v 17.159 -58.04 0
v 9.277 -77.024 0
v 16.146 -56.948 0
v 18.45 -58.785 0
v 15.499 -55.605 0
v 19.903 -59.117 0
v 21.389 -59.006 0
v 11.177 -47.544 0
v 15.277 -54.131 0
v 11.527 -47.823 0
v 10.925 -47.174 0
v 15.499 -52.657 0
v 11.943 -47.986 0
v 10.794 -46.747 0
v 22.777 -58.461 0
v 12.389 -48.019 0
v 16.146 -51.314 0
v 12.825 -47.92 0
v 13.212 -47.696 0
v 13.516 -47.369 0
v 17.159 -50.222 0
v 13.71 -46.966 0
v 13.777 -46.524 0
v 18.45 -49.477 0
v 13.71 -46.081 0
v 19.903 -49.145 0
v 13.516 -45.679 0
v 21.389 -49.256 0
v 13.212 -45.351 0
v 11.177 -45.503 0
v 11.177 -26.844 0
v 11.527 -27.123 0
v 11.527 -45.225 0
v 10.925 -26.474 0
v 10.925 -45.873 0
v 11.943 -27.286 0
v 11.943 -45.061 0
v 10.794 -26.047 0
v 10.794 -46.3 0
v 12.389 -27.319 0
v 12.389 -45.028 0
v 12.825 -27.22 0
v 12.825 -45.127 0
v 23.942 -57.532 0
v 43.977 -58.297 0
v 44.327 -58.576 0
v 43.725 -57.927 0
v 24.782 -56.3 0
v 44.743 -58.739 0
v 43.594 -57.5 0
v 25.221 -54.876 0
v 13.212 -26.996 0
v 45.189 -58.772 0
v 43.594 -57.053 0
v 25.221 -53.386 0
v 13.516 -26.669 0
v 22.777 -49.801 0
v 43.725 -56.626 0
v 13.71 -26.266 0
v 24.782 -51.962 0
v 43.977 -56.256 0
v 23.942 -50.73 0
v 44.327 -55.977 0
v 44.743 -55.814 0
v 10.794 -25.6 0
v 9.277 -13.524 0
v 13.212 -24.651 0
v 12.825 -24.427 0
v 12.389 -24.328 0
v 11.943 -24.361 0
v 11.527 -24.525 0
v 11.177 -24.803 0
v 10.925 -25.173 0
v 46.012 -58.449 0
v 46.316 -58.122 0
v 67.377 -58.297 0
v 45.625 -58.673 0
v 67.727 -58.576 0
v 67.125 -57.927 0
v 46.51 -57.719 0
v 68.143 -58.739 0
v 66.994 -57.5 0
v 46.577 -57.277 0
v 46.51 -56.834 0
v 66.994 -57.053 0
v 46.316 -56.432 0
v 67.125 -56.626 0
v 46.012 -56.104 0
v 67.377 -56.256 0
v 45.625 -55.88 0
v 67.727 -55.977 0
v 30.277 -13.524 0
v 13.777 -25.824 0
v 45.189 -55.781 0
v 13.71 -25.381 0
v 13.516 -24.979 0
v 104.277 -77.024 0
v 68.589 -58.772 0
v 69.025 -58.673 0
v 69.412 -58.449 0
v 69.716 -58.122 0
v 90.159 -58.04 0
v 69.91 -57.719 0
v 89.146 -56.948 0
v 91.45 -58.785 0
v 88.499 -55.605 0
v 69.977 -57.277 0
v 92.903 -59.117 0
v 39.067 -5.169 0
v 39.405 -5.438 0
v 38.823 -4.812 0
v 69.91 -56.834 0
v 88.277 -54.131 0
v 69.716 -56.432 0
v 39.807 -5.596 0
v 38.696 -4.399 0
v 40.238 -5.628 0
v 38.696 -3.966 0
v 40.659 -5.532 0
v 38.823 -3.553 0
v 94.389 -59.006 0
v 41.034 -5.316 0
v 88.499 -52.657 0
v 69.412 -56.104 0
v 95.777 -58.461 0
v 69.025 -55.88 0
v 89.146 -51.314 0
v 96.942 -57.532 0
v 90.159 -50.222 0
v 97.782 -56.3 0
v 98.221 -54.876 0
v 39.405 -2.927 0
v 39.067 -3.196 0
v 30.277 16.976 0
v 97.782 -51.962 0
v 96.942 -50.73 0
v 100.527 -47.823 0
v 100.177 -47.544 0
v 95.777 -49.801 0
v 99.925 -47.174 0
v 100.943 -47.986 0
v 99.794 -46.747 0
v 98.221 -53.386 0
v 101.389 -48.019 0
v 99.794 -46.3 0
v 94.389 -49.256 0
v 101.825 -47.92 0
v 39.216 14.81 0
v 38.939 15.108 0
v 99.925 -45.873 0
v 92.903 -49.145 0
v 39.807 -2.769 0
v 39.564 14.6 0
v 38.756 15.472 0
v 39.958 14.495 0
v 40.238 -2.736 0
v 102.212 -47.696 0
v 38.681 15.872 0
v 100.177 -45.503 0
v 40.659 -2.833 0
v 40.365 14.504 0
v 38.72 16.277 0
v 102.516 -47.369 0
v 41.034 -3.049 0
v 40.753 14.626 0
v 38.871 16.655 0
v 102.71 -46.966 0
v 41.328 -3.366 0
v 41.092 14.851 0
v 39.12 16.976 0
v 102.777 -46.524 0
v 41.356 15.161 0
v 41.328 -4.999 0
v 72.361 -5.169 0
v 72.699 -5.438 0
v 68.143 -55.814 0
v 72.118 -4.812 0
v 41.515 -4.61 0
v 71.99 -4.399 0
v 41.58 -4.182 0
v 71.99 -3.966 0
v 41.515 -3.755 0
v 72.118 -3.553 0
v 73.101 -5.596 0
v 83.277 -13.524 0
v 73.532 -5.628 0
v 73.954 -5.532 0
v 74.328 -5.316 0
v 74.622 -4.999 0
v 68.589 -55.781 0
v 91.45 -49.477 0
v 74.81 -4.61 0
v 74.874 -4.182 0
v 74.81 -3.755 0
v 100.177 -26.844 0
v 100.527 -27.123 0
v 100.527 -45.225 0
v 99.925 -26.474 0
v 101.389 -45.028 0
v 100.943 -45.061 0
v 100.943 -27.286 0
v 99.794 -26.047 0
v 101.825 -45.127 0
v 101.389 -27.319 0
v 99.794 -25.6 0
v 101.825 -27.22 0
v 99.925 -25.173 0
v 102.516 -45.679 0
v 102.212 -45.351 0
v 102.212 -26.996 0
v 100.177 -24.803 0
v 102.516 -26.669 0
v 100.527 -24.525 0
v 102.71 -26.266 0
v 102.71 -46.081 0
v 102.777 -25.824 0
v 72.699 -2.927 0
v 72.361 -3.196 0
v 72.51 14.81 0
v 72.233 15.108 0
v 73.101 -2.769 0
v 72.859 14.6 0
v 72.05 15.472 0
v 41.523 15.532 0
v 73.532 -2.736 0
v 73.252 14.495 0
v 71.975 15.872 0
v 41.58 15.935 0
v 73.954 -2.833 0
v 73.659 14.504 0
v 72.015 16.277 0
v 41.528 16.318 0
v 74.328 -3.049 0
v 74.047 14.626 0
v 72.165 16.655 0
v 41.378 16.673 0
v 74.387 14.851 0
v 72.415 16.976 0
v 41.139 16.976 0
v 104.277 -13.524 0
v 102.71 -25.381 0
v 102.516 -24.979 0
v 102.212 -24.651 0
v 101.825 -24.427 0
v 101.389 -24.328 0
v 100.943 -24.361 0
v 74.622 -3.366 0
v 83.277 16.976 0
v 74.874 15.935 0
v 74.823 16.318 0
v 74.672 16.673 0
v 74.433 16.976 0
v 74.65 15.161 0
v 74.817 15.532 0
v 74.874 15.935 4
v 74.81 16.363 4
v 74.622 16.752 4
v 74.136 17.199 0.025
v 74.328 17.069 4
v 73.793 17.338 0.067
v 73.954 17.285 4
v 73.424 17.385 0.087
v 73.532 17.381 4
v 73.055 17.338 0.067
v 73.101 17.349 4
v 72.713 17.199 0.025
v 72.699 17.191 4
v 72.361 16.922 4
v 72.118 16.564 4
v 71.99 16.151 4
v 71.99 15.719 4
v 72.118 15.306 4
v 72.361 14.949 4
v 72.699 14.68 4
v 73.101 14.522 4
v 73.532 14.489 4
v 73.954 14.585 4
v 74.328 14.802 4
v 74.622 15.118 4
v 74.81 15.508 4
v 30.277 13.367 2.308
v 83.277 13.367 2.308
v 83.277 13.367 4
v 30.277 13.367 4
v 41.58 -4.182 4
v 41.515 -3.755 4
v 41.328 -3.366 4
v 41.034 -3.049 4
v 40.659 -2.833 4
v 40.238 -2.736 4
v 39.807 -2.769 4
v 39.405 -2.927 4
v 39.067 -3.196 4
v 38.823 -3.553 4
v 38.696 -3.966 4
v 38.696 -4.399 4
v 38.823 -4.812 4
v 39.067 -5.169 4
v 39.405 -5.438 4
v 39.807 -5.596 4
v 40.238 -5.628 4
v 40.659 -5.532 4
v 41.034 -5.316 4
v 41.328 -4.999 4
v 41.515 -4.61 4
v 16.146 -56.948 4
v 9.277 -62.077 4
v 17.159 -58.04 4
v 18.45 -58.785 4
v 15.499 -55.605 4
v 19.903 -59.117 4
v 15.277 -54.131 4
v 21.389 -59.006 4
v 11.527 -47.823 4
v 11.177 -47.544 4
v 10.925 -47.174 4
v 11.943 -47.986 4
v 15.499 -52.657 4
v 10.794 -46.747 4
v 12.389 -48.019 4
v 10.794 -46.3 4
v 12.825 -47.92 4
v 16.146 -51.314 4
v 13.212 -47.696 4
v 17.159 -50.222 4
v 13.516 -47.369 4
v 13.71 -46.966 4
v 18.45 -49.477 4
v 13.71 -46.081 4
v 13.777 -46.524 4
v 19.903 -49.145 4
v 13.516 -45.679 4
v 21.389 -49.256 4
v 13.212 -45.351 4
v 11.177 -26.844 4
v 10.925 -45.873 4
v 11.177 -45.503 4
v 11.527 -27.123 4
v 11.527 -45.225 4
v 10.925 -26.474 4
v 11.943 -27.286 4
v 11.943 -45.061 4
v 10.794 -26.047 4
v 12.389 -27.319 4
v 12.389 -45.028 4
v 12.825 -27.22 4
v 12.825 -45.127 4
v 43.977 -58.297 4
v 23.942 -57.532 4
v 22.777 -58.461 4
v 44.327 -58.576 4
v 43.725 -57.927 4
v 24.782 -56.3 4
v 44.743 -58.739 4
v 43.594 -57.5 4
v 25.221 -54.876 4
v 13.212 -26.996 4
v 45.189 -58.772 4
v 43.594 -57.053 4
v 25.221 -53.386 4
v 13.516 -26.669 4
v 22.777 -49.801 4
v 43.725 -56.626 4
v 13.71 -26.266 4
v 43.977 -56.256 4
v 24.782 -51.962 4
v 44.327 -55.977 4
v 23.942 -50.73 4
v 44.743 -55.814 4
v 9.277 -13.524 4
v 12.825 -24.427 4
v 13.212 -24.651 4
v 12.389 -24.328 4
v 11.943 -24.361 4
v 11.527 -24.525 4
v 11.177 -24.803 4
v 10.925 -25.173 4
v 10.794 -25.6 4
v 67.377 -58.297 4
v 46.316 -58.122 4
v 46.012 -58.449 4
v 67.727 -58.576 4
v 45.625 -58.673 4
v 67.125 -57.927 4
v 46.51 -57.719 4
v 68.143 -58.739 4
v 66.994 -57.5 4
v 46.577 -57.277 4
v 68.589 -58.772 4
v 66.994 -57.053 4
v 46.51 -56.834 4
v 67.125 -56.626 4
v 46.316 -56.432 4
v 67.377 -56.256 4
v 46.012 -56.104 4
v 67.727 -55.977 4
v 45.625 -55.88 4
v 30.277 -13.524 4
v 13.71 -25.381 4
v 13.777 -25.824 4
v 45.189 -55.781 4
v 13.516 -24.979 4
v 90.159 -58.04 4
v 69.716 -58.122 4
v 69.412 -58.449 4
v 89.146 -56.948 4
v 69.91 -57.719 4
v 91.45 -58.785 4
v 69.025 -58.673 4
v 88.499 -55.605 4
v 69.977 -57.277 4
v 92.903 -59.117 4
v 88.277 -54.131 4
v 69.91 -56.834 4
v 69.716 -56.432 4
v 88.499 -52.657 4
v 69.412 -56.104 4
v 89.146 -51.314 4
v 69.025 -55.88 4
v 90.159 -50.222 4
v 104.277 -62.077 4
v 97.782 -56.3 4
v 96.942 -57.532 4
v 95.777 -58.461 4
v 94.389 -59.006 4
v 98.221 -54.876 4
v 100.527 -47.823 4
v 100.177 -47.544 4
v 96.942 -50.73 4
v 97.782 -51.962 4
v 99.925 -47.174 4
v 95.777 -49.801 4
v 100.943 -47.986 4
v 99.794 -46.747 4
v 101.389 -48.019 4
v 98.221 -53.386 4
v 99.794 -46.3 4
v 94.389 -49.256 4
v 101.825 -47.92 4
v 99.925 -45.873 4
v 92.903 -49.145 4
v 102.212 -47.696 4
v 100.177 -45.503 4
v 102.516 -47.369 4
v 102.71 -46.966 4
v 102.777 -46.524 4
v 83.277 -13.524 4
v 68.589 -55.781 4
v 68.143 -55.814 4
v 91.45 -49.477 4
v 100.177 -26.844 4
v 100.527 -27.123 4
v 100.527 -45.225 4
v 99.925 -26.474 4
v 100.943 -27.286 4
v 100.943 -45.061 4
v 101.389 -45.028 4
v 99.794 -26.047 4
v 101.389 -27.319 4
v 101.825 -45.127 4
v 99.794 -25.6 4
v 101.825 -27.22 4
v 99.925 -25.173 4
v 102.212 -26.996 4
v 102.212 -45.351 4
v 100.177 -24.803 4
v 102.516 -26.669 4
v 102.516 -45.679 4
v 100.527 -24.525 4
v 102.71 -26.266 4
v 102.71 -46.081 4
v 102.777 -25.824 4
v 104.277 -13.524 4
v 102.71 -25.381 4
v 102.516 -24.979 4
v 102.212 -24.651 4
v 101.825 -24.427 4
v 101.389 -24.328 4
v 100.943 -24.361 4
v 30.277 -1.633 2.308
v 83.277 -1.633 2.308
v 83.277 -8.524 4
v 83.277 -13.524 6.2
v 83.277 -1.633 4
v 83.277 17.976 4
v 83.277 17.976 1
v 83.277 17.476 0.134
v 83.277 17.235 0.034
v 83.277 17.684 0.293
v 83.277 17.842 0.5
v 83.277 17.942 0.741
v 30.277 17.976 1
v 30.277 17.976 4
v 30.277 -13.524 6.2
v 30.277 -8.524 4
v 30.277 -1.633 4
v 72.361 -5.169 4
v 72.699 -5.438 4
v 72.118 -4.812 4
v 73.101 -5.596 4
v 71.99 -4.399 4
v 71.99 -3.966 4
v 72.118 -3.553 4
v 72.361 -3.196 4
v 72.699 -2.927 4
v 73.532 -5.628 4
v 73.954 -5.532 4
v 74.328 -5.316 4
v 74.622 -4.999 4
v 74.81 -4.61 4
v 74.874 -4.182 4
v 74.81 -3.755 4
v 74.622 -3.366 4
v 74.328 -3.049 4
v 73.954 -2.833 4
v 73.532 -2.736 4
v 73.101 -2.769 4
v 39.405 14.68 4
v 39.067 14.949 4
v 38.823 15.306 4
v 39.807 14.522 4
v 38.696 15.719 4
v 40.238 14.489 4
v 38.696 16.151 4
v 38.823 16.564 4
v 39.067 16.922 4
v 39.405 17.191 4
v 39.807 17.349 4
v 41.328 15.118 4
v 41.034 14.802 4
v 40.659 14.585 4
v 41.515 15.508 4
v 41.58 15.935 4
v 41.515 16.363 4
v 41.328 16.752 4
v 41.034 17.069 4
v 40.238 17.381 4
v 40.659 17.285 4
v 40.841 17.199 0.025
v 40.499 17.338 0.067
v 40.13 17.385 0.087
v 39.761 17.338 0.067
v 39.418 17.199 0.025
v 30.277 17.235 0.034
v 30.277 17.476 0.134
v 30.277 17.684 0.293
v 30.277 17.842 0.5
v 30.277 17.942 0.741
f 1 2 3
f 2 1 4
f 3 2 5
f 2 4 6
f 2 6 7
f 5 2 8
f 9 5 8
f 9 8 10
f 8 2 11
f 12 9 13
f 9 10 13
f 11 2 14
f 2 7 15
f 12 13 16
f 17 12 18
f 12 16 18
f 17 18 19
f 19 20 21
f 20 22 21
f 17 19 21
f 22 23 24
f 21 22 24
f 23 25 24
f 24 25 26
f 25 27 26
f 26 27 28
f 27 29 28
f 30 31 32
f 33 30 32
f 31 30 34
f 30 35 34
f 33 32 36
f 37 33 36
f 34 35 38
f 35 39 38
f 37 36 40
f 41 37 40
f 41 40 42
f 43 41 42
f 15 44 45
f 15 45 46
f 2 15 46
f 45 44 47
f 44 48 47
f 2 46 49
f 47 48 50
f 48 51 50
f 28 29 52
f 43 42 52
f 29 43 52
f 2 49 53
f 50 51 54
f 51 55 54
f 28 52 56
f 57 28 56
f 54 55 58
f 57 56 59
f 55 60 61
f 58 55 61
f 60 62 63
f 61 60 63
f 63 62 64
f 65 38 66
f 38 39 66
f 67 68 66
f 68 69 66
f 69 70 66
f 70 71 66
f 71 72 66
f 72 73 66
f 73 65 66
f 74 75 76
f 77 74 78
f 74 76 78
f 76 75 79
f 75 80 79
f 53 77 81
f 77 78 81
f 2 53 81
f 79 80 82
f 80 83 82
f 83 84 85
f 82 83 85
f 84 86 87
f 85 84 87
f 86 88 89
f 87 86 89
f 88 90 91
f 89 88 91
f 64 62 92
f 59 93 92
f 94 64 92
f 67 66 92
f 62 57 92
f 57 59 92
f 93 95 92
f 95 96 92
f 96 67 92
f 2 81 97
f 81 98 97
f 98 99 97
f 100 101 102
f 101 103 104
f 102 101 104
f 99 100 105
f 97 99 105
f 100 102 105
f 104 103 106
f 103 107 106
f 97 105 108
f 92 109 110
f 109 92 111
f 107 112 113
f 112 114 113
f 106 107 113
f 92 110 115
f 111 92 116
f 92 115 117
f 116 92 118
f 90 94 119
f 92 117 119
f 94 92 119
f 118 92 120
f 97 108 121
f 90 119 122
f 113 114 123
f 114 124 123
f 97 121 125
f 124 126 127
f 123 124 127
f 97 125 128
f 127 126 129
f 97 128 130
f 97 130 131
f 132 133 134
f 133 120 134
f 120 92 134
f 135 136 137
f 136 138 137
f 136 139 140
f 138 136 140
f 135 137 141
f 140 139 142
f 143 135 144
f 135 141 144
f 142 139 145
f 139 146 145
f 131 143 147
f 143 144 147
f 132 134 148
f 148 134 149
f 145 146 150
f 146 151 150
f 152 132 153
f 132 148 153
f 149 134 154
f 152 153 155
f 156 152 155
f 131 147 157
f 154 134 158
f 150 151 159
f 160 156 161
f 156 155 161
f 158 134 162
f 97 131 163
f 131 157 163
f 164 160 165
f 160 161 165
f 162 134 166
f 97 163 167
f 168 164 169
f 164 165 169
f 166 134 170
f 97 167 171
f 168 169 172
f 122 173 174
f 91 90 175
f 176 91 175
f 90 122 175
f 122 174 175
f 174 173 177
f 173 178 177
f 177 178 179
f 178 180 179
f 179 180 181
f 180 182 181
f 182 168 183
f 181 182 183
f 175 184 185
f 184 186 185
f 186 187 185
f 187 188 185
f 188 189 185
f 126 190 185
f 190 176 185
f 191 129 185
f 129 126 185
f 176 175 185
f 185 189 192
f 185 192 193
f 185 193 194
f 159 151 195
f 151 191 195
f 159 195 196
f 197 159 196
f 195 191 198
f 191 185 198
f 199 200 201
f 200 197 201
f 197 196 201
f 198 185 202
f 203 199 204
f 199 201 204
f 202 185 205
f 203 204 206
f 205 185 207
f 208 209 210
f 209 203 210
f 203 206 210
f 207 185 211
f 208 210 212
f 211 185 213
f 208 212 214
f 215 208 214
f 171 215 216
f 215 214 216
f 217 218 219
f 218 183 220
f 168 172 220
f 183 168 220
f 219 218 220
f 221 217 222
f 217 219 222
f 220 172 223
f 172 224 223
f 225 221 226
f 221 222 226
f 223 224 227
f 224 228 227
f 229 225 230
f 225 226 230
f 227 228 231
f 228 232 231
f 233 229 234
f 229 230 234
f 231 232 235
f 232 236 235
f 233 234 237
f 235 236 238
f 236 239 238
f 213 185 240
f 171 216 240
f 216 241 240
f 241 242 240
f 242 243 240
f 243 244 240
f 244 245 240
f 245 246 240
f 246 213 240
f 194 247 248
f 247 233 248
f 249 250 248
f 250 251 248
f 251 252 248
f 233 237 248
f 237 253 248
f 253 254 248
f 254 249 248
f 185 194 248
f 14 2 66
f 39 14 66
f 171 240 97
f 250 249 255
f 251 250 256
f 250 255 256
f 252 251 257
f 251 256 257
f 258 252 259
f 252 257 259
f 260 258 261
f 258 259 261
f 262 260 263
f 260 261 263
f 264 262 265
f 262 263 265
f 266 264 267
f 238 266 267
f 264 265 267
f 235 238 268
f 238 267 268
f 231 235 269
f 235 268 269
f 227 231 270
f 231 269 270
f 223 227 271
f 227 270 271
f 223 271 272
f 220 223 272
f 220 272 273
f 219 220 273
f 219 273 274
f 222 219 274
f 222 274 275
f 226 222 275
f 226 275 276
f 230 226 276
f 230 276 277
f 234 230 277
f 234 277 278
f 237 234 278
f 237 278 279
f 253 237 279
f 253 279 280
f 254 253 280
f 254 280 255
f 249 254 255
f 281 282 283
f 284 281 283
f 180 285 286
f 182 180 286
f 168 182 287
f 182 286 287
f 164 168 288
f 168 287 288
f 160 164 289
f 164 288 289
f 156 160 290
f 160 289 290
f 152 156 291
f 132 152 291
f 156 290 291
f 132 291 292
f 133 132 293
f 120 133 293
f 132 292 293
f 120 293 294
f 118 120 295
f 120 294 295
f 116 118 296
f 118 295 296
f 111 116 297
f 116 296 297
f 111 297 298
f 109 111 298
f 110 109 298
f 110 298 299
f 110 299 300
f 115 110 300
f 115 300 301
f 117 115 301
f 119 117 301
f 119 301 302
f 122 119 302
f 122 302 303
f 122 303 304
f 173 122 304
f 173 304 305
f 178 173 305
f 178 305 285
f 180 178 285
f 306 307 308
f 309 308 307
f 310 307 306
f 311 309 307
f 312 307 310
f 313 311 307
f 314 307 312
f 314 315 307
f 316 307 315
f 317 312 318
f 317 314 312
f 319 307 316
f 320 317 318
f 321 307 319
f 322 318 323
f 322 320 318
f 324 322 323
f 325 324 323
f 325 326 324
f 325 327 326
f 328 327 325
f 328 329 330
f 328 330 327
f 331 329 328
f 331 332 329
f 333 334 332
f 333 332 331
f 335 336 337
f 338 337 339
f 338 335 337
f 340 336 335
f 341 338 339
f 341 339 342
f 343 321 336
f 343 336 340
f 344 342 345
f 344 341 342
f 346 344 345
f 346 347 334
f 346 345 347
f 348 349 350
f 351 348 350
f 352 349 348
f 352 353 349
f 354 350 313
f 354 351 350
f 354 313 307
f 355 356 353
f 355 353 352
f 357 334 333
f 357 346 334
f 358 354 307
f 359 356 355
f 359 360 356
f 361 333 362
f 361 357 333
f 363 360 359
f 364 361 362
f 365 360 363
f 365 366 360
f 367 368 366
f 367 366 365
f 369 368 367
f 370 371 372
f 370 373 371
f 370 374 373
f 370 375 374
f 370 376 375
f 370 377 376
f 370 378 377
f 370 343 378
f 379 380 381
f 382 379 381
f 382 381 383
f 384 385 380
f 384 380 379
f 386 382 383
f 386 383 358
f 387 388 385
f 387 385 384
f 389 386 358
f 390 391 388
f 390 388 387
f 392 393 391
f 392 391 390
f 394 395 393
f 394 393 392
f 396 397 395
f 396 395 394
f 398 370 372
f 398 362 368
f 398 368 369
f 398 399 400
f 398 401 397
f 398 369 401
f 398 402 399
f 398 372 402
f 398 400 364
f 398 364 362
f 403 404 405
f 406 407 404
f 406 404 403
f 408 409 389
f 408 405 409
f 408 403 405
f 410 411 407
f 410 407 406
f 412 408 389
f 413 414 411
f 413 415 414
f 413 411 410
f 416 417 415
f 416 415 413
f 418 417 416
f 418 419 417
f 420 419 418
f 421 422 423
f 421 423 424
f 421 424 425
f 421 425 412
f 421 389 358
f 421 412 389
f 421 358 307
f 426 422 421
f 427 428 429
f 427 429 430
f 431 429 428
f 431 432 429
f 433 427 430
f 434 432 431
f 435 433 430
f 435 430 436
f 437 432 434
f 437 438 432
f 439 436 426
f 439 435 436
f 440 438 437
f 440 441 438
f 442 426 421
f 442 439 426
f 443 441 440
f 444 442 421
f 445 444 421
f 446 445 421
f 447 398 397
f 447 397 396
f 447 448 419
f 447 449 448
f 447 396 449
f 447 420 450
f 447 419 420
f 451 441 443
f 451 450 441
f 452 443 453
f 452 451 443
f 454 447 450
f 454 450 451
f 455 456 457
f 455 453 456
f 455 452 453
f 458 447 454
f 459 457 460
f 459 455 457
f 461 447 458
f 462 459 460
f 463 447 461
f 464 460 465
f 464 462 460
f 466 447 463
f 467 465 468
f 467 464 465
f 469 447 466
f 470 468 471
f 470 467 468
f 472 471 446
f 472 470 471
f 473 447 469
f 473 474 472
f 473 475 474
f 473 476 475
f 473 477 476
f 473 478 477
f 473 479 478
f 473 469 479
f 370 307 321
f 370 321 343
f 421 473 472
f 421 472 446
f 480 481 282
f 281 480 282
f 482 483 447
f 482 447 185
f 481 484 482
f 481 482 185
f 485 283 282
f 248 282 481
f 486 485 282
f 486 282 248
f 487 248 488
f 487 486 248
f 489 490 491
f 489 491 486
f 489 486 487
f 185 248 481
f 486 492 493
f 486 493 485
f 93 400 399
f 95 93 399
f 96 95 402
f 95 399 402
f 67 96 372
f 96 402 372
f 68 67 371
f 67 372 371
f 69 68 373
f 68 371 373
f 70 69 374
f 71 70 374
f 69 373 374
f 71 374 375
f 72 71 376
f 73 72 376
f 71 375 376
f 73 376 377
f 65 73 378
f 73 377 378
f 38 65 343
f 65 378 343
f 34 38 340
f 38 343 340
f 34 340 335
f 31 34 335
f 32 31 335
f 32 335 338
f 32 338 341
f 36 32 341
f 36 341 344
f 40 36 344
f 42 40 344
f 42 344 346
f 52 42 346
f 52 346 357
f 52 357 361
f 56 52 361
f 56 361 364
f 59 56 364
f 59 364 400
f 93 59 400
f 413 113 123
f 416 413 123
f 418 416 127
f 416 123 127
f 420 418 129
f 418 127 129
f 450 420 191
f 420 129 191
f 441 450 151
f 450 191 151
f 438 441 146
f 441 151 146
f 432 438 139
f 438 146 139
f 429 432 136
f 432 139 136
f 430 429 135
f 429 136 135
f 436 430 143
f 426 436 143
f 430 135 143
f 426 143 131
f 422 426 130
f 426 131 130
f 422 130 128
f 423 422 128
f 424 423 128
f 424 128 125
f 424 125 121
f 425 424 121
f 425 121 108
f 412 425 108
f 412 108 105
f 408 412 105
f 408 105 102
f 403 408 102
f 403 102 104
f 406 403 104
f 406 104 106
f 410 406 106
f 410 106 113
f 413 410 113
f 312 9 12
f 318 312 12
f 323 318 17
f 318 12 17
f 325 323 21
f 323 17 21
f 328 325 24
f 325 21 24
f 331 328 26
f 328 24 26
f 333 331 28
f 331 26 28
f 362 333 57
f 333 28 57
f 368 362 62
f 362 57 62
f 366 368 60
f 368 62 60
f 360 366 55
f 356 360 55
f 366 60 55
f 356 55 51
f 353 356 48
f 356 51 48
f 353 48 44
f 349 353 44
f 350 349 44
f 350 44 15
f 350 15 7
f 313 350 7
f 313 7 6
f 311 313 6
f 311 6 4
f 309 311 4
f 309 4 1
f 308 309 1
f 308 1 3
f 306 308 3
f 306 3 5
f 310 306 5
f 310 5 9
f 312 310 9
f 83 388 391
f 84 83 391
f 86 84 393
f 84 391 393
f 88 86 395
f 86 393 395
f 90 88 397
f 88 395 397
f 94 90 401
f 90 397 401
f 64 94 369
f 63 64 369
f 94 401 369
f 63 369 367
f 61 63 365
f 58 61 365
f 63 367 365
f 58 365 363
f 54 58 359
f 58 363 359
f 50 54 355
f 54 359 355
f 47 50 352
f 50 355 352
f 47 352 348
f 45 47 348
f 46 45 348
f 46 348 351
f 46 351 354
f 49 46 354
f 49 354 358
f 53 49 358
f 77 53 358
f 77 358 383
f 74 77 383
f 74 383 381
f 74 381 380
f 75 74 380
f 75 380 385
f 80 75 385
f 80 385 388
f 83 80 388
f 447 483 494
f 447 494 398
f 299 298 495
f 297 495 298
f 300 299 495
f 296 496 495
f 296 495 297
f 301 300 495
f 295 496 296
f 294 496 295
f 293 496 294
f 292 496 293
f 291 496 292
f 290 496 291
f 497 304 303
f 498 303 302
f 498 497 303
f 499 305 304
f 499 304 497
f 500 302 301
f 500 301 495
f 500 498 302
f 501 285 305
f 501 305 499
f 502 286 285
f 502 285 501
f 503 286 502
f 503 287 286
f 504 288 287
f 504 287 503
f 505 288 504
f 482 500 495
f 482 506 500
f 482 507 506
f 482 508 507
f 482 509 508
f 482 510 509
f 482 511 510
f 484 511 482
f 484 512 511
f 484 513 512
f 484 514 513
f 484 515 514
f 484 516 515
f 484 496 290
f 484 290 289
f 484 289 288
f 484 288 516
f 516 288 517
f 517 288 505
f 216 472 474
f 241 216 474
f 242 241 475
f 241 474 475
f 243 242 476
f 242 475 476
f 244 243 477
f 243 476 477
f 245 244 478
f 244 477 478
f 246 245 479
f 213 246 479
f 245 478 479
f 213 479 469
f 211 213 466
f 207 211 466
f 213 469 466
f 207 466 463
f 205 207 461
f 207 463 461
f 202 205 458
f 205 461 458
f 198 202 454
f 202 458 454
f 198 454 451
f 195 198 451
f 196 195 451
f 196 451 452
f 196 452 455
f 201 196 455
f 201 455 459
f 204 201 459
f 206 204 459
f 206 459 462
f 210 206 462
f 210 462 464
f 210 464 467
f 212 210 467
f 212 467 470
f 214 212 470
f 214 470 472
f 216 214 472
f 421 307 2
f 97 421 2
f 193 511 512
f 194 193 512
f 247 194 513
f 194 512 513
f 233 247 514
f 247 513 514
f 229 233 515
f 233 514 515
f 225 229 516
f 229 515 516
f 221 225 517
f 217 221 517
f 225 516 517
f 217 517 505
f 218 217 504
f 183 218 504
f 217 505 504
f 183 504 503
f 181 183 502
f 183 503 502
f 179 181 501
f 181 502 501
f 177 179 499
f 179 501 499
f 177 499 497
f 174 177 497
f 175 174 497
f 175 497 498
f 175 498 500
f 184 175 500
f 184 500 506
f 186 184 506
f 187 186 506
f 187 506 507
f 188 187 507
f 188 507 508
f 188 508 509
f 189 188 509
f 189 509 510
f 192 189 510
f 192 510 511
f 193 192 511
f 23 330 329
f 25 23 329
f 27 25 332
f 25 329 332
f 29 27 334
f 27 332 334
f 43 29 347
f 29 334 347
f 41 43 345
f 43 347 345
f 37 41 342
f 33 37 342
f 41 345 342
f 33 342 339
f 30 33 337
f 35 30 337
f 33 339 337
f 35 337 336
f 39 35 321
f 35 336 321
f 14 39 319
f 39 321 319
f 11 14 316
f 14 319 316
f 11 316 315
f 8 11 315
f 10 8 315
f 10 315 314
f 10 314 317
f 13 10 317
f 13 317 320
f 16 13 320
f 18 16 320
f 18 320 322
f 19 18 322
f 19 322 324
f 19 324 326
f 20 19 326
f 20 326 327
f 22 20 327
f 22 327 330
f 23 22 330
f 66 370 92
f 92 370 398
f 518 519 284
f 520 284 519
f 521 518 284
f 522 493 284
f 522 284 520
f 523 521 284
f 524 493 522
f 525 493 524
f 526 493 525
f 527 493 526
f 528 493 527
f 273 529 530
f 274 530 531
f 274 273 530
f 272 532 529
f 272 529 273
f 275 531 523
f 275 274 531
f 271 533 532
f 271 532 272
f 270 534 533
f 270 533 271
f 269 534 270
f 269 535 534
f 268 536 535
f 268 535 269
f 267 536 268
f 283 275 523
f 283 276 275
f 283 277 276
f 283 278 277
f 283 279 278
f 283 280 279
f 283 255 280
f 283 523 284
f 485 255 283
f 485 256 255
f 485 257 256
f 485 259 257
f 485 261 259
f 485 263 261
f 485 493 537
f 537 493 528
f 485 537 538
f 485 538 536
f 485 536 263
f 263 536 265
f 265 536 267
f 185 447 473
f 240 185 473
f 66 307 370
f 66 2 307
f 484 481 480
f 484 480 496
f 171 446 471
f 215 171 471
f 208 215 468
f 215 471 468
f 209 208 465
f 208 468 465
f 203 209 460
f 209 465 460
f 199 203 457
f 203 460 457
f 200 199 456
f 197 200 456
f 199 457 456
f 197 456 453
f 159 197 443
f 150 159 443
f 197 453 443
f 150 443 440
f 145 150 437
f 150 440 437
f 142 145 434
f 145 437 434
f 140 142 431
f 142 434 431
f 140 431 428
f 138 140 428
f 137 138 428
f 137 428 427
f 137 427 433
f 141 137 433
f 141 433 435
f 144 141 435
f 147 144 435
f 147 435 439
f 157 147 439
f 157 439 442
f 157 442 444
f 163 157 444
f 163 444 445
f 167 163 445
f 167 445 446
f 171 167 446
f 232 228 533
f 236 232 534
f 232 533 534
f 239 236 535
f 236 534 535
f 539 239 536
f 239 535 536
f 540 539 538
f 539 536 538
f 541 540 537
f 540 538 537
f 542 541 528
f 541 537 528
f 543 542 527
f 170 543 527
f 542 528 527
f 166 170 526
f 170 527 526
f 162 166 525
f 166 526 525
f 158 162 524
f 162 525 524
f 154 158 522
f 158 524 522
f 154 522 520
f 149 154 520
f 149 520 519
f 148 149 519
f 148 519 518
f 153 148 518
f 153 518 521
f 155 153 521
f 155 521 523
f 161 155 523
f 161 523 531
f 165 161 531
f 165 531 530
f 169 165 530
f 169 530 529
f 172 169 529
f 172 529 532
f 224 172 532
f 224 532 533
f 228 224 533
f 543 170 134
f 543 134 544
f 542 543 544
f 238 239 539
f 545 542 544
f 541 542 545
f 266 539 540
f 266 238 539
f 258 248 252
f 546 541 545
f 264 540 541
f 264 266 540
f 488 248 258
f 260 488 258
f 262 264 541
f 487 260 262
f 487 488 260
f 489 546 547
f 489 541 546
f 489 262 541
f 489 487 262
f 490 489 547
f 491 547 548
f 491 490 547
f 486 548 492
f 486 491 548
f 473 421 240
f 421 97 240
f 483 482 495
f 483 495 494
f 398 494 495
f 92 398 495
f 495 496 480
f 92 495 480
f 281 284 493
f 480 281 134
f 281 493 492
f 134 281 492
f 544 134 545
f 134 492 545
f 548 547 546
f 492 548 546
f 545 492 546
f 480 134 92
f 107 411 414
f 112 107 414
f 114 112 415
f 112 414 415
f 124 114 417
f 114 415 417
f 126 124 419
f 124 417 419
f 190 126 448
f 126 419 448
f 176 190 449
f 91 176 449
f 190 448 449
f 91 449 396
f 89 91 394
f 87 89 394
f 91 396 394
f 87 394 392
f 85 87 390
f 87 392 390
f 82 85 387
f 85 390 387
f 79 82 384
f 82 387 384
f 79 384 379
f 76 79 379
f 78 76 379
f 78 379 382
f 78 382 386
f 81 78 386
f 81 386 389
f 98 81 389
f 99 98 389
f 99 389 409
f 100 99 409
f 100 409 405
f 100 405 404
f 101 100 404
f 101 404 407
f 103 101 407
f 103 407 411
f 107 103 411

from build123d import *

# Parameters (mm, degrees)
CROQUIS1_W              = 95
CROQUIS1_H              = 95
SALIENTE_EXTRUIR1_DEPTH = 4
CORTAR_EXTRUIR1_DEPTH   = 100
CROQUIS5_W              = 21
CROQUIS5_H              = 31.5
CORTAR_EXTRUIR2_DEPTH   = 100
CROQUIS6_W              = 21
CROQUIS6_H              = 31.5
CORTAR_EXTRUIR3_DEPTH   = 100
CROQUIS7_W              = 3
CROQUIS7_H              = 15
CORTAR_EXTRUIR4_DEPTH   = 100
REDONDEO1_R             = 1
CROQUIS8_R              = 5
CORTAR_EXTRUIR5_DEPTH   = 10
SALIENTE_EXTRUIR2_DEPTH = 53
CROQUIS10_R             = 1.5
CORTAR_EXTRUIR6_DEPTH   = 10
CROQUIS11_R             = 1.45
CORTAR_EXTRUIR7_DEPTH   = 20


with BuildPart() as part:
    # Croquis1 → Saliente-Extruir1 (new body)
    with BuildSketch(Plane.XY):
        with Locations((56.776857567, -29.52358237)):
            Rectangle(CROQUIS1_W, CROQUIS1_H)
    extrude(amount=SALIENTE_EXTRUIR1_DEPTH)

    # Croquis3 → Cortar-Extruir1 (cut)
    with BuildSketch(Plane.ZY.offset(-9.276857567)):
        Polygon((4, -62.076521477), (0, -77.02358237), (4, -77.02358237), align=None)
    extrude(amount=-CORTAR_EXTRUIR1_DEPTH, mode=Mode.SUBTRACT)

    # Croquis5 → Cortar-Extruir2 (cut)
    with BuildSketch(Plane.XY.offset(4)):
        with Locations((19.776857567, 2.22641763)):
            Rectangle(CROQUIS5_W, CROQUIS5_H)
    extrude(amount=-CORTAR_EXTRUIR2_DEPTH, mode=Mode.SUBTRACT)

    # Croquis6 → Cortar-Extruir3 (cut)
    with BuildSketch(Plane.XY.offset(4)):
        with Locations((93.776857567, 2.22641763)):
            Rectangle(CROQUIS6_W, CROQUIS6_H)
    extrude(amount=-CORTAR_EXTRUIR3_DEPTH, mode=Mode.SUBTRACT)

    # Croquis7 → Cortar-Extruir4 (cut)
    with BuildSketch(Plane.ZY.offset(-30.276857567)):
        with Locations((3.808437884, 5.867431485)):
            Rectangle(CROQUIS7_W, CROQUIS7_H)
    extrude(amount=-CORTAR_EXTRUIR4_DEPTH, mode=Mode.SUBTRACT)

    # Redondeo1
    redondeo1_edges = [part.edges().sort_by_distance(p)[0] for p in [
        (56.776857567, 17.97641763, 0),
    ]]
    fillet(redondeo1_edges, radius=REDONDEO1_R)

    # Croquis8 → Cortar-Extruir5 (cut)
    with BuildSketch(Plane(origin=(0, 0, 0), x_dir=(-1, 0, 0), z_dir=(0, 0, -1))):
        with Locations((-93.276857567, -54.130923869)):
            Circle(CROQUIS8_R)
        with Locations((-20.276857567, -54.130923869)):
            Circle(CROQUIS8_R)
    extrude(amount=-CORTAR_EXTRUIR5_DEPTH, mode=Mode.SUBTRACT)

    # Croquis9 → Saliente-Extruir2 (add)
    with BuildSketch(Plane.ZY.offset(-30.276857567)):
        Polygon((4, -13.52358237), (4, -8.52358237), (6.2, -13.52358237), align=None)
    extrude(amount=-SALIENTE_EXTRUIR2_DEPTH)

    # Croquis10 → Cortar-Extruir6 (cut)
    with BuildSketch(Plane.XY.offset(4)):
        with Locations((12.276857567, -25.82358237)):
            Circle(CROQUIS10_R)
        with Locations((12.276857567, -46.52358237)):
            Circle(CROQUIS10_R)
        with Locations((45.076857567, -57.276521477)):
            Circle(CROQUIS10_R)
        with Locations((68.476857567, -57.276521477)):
            Circle(CROQUIS10_R)
        with Locations((101.276857567, -25.82358237)):
            Circle(CROQUIS10_R)
        with Locations((101.276857567, -46.52358237)):
            Circle(CROQUIS10_R)
    extrude(amount=-CORTAR_EXTRUIR6_DEPTH, mode=Mode.SUBTRACT)

    # Croquis11 → Cortar-Extruir7 (cut)
    with BuildSketch(Plane.XY.offset(4)):
        with Locations((40.129677313, 15.935254897)):
            Circle(CROQUIS11_R)
        with Locations((73.424037821, 15.935254897)):
            Circle(CROQUIS11_R)
        with Locations((40.129677313, -4.182419638)):
            Circle(CROQUIS11_R)
        with Locations((73.424037821, -4.182419638)):
            Circle(CROQUIS11_R)
    extrude(amount=-CORTAR_EXTRUIR7_DEPTH, mode=Mode.SUBTRACT)


solid = part.part
